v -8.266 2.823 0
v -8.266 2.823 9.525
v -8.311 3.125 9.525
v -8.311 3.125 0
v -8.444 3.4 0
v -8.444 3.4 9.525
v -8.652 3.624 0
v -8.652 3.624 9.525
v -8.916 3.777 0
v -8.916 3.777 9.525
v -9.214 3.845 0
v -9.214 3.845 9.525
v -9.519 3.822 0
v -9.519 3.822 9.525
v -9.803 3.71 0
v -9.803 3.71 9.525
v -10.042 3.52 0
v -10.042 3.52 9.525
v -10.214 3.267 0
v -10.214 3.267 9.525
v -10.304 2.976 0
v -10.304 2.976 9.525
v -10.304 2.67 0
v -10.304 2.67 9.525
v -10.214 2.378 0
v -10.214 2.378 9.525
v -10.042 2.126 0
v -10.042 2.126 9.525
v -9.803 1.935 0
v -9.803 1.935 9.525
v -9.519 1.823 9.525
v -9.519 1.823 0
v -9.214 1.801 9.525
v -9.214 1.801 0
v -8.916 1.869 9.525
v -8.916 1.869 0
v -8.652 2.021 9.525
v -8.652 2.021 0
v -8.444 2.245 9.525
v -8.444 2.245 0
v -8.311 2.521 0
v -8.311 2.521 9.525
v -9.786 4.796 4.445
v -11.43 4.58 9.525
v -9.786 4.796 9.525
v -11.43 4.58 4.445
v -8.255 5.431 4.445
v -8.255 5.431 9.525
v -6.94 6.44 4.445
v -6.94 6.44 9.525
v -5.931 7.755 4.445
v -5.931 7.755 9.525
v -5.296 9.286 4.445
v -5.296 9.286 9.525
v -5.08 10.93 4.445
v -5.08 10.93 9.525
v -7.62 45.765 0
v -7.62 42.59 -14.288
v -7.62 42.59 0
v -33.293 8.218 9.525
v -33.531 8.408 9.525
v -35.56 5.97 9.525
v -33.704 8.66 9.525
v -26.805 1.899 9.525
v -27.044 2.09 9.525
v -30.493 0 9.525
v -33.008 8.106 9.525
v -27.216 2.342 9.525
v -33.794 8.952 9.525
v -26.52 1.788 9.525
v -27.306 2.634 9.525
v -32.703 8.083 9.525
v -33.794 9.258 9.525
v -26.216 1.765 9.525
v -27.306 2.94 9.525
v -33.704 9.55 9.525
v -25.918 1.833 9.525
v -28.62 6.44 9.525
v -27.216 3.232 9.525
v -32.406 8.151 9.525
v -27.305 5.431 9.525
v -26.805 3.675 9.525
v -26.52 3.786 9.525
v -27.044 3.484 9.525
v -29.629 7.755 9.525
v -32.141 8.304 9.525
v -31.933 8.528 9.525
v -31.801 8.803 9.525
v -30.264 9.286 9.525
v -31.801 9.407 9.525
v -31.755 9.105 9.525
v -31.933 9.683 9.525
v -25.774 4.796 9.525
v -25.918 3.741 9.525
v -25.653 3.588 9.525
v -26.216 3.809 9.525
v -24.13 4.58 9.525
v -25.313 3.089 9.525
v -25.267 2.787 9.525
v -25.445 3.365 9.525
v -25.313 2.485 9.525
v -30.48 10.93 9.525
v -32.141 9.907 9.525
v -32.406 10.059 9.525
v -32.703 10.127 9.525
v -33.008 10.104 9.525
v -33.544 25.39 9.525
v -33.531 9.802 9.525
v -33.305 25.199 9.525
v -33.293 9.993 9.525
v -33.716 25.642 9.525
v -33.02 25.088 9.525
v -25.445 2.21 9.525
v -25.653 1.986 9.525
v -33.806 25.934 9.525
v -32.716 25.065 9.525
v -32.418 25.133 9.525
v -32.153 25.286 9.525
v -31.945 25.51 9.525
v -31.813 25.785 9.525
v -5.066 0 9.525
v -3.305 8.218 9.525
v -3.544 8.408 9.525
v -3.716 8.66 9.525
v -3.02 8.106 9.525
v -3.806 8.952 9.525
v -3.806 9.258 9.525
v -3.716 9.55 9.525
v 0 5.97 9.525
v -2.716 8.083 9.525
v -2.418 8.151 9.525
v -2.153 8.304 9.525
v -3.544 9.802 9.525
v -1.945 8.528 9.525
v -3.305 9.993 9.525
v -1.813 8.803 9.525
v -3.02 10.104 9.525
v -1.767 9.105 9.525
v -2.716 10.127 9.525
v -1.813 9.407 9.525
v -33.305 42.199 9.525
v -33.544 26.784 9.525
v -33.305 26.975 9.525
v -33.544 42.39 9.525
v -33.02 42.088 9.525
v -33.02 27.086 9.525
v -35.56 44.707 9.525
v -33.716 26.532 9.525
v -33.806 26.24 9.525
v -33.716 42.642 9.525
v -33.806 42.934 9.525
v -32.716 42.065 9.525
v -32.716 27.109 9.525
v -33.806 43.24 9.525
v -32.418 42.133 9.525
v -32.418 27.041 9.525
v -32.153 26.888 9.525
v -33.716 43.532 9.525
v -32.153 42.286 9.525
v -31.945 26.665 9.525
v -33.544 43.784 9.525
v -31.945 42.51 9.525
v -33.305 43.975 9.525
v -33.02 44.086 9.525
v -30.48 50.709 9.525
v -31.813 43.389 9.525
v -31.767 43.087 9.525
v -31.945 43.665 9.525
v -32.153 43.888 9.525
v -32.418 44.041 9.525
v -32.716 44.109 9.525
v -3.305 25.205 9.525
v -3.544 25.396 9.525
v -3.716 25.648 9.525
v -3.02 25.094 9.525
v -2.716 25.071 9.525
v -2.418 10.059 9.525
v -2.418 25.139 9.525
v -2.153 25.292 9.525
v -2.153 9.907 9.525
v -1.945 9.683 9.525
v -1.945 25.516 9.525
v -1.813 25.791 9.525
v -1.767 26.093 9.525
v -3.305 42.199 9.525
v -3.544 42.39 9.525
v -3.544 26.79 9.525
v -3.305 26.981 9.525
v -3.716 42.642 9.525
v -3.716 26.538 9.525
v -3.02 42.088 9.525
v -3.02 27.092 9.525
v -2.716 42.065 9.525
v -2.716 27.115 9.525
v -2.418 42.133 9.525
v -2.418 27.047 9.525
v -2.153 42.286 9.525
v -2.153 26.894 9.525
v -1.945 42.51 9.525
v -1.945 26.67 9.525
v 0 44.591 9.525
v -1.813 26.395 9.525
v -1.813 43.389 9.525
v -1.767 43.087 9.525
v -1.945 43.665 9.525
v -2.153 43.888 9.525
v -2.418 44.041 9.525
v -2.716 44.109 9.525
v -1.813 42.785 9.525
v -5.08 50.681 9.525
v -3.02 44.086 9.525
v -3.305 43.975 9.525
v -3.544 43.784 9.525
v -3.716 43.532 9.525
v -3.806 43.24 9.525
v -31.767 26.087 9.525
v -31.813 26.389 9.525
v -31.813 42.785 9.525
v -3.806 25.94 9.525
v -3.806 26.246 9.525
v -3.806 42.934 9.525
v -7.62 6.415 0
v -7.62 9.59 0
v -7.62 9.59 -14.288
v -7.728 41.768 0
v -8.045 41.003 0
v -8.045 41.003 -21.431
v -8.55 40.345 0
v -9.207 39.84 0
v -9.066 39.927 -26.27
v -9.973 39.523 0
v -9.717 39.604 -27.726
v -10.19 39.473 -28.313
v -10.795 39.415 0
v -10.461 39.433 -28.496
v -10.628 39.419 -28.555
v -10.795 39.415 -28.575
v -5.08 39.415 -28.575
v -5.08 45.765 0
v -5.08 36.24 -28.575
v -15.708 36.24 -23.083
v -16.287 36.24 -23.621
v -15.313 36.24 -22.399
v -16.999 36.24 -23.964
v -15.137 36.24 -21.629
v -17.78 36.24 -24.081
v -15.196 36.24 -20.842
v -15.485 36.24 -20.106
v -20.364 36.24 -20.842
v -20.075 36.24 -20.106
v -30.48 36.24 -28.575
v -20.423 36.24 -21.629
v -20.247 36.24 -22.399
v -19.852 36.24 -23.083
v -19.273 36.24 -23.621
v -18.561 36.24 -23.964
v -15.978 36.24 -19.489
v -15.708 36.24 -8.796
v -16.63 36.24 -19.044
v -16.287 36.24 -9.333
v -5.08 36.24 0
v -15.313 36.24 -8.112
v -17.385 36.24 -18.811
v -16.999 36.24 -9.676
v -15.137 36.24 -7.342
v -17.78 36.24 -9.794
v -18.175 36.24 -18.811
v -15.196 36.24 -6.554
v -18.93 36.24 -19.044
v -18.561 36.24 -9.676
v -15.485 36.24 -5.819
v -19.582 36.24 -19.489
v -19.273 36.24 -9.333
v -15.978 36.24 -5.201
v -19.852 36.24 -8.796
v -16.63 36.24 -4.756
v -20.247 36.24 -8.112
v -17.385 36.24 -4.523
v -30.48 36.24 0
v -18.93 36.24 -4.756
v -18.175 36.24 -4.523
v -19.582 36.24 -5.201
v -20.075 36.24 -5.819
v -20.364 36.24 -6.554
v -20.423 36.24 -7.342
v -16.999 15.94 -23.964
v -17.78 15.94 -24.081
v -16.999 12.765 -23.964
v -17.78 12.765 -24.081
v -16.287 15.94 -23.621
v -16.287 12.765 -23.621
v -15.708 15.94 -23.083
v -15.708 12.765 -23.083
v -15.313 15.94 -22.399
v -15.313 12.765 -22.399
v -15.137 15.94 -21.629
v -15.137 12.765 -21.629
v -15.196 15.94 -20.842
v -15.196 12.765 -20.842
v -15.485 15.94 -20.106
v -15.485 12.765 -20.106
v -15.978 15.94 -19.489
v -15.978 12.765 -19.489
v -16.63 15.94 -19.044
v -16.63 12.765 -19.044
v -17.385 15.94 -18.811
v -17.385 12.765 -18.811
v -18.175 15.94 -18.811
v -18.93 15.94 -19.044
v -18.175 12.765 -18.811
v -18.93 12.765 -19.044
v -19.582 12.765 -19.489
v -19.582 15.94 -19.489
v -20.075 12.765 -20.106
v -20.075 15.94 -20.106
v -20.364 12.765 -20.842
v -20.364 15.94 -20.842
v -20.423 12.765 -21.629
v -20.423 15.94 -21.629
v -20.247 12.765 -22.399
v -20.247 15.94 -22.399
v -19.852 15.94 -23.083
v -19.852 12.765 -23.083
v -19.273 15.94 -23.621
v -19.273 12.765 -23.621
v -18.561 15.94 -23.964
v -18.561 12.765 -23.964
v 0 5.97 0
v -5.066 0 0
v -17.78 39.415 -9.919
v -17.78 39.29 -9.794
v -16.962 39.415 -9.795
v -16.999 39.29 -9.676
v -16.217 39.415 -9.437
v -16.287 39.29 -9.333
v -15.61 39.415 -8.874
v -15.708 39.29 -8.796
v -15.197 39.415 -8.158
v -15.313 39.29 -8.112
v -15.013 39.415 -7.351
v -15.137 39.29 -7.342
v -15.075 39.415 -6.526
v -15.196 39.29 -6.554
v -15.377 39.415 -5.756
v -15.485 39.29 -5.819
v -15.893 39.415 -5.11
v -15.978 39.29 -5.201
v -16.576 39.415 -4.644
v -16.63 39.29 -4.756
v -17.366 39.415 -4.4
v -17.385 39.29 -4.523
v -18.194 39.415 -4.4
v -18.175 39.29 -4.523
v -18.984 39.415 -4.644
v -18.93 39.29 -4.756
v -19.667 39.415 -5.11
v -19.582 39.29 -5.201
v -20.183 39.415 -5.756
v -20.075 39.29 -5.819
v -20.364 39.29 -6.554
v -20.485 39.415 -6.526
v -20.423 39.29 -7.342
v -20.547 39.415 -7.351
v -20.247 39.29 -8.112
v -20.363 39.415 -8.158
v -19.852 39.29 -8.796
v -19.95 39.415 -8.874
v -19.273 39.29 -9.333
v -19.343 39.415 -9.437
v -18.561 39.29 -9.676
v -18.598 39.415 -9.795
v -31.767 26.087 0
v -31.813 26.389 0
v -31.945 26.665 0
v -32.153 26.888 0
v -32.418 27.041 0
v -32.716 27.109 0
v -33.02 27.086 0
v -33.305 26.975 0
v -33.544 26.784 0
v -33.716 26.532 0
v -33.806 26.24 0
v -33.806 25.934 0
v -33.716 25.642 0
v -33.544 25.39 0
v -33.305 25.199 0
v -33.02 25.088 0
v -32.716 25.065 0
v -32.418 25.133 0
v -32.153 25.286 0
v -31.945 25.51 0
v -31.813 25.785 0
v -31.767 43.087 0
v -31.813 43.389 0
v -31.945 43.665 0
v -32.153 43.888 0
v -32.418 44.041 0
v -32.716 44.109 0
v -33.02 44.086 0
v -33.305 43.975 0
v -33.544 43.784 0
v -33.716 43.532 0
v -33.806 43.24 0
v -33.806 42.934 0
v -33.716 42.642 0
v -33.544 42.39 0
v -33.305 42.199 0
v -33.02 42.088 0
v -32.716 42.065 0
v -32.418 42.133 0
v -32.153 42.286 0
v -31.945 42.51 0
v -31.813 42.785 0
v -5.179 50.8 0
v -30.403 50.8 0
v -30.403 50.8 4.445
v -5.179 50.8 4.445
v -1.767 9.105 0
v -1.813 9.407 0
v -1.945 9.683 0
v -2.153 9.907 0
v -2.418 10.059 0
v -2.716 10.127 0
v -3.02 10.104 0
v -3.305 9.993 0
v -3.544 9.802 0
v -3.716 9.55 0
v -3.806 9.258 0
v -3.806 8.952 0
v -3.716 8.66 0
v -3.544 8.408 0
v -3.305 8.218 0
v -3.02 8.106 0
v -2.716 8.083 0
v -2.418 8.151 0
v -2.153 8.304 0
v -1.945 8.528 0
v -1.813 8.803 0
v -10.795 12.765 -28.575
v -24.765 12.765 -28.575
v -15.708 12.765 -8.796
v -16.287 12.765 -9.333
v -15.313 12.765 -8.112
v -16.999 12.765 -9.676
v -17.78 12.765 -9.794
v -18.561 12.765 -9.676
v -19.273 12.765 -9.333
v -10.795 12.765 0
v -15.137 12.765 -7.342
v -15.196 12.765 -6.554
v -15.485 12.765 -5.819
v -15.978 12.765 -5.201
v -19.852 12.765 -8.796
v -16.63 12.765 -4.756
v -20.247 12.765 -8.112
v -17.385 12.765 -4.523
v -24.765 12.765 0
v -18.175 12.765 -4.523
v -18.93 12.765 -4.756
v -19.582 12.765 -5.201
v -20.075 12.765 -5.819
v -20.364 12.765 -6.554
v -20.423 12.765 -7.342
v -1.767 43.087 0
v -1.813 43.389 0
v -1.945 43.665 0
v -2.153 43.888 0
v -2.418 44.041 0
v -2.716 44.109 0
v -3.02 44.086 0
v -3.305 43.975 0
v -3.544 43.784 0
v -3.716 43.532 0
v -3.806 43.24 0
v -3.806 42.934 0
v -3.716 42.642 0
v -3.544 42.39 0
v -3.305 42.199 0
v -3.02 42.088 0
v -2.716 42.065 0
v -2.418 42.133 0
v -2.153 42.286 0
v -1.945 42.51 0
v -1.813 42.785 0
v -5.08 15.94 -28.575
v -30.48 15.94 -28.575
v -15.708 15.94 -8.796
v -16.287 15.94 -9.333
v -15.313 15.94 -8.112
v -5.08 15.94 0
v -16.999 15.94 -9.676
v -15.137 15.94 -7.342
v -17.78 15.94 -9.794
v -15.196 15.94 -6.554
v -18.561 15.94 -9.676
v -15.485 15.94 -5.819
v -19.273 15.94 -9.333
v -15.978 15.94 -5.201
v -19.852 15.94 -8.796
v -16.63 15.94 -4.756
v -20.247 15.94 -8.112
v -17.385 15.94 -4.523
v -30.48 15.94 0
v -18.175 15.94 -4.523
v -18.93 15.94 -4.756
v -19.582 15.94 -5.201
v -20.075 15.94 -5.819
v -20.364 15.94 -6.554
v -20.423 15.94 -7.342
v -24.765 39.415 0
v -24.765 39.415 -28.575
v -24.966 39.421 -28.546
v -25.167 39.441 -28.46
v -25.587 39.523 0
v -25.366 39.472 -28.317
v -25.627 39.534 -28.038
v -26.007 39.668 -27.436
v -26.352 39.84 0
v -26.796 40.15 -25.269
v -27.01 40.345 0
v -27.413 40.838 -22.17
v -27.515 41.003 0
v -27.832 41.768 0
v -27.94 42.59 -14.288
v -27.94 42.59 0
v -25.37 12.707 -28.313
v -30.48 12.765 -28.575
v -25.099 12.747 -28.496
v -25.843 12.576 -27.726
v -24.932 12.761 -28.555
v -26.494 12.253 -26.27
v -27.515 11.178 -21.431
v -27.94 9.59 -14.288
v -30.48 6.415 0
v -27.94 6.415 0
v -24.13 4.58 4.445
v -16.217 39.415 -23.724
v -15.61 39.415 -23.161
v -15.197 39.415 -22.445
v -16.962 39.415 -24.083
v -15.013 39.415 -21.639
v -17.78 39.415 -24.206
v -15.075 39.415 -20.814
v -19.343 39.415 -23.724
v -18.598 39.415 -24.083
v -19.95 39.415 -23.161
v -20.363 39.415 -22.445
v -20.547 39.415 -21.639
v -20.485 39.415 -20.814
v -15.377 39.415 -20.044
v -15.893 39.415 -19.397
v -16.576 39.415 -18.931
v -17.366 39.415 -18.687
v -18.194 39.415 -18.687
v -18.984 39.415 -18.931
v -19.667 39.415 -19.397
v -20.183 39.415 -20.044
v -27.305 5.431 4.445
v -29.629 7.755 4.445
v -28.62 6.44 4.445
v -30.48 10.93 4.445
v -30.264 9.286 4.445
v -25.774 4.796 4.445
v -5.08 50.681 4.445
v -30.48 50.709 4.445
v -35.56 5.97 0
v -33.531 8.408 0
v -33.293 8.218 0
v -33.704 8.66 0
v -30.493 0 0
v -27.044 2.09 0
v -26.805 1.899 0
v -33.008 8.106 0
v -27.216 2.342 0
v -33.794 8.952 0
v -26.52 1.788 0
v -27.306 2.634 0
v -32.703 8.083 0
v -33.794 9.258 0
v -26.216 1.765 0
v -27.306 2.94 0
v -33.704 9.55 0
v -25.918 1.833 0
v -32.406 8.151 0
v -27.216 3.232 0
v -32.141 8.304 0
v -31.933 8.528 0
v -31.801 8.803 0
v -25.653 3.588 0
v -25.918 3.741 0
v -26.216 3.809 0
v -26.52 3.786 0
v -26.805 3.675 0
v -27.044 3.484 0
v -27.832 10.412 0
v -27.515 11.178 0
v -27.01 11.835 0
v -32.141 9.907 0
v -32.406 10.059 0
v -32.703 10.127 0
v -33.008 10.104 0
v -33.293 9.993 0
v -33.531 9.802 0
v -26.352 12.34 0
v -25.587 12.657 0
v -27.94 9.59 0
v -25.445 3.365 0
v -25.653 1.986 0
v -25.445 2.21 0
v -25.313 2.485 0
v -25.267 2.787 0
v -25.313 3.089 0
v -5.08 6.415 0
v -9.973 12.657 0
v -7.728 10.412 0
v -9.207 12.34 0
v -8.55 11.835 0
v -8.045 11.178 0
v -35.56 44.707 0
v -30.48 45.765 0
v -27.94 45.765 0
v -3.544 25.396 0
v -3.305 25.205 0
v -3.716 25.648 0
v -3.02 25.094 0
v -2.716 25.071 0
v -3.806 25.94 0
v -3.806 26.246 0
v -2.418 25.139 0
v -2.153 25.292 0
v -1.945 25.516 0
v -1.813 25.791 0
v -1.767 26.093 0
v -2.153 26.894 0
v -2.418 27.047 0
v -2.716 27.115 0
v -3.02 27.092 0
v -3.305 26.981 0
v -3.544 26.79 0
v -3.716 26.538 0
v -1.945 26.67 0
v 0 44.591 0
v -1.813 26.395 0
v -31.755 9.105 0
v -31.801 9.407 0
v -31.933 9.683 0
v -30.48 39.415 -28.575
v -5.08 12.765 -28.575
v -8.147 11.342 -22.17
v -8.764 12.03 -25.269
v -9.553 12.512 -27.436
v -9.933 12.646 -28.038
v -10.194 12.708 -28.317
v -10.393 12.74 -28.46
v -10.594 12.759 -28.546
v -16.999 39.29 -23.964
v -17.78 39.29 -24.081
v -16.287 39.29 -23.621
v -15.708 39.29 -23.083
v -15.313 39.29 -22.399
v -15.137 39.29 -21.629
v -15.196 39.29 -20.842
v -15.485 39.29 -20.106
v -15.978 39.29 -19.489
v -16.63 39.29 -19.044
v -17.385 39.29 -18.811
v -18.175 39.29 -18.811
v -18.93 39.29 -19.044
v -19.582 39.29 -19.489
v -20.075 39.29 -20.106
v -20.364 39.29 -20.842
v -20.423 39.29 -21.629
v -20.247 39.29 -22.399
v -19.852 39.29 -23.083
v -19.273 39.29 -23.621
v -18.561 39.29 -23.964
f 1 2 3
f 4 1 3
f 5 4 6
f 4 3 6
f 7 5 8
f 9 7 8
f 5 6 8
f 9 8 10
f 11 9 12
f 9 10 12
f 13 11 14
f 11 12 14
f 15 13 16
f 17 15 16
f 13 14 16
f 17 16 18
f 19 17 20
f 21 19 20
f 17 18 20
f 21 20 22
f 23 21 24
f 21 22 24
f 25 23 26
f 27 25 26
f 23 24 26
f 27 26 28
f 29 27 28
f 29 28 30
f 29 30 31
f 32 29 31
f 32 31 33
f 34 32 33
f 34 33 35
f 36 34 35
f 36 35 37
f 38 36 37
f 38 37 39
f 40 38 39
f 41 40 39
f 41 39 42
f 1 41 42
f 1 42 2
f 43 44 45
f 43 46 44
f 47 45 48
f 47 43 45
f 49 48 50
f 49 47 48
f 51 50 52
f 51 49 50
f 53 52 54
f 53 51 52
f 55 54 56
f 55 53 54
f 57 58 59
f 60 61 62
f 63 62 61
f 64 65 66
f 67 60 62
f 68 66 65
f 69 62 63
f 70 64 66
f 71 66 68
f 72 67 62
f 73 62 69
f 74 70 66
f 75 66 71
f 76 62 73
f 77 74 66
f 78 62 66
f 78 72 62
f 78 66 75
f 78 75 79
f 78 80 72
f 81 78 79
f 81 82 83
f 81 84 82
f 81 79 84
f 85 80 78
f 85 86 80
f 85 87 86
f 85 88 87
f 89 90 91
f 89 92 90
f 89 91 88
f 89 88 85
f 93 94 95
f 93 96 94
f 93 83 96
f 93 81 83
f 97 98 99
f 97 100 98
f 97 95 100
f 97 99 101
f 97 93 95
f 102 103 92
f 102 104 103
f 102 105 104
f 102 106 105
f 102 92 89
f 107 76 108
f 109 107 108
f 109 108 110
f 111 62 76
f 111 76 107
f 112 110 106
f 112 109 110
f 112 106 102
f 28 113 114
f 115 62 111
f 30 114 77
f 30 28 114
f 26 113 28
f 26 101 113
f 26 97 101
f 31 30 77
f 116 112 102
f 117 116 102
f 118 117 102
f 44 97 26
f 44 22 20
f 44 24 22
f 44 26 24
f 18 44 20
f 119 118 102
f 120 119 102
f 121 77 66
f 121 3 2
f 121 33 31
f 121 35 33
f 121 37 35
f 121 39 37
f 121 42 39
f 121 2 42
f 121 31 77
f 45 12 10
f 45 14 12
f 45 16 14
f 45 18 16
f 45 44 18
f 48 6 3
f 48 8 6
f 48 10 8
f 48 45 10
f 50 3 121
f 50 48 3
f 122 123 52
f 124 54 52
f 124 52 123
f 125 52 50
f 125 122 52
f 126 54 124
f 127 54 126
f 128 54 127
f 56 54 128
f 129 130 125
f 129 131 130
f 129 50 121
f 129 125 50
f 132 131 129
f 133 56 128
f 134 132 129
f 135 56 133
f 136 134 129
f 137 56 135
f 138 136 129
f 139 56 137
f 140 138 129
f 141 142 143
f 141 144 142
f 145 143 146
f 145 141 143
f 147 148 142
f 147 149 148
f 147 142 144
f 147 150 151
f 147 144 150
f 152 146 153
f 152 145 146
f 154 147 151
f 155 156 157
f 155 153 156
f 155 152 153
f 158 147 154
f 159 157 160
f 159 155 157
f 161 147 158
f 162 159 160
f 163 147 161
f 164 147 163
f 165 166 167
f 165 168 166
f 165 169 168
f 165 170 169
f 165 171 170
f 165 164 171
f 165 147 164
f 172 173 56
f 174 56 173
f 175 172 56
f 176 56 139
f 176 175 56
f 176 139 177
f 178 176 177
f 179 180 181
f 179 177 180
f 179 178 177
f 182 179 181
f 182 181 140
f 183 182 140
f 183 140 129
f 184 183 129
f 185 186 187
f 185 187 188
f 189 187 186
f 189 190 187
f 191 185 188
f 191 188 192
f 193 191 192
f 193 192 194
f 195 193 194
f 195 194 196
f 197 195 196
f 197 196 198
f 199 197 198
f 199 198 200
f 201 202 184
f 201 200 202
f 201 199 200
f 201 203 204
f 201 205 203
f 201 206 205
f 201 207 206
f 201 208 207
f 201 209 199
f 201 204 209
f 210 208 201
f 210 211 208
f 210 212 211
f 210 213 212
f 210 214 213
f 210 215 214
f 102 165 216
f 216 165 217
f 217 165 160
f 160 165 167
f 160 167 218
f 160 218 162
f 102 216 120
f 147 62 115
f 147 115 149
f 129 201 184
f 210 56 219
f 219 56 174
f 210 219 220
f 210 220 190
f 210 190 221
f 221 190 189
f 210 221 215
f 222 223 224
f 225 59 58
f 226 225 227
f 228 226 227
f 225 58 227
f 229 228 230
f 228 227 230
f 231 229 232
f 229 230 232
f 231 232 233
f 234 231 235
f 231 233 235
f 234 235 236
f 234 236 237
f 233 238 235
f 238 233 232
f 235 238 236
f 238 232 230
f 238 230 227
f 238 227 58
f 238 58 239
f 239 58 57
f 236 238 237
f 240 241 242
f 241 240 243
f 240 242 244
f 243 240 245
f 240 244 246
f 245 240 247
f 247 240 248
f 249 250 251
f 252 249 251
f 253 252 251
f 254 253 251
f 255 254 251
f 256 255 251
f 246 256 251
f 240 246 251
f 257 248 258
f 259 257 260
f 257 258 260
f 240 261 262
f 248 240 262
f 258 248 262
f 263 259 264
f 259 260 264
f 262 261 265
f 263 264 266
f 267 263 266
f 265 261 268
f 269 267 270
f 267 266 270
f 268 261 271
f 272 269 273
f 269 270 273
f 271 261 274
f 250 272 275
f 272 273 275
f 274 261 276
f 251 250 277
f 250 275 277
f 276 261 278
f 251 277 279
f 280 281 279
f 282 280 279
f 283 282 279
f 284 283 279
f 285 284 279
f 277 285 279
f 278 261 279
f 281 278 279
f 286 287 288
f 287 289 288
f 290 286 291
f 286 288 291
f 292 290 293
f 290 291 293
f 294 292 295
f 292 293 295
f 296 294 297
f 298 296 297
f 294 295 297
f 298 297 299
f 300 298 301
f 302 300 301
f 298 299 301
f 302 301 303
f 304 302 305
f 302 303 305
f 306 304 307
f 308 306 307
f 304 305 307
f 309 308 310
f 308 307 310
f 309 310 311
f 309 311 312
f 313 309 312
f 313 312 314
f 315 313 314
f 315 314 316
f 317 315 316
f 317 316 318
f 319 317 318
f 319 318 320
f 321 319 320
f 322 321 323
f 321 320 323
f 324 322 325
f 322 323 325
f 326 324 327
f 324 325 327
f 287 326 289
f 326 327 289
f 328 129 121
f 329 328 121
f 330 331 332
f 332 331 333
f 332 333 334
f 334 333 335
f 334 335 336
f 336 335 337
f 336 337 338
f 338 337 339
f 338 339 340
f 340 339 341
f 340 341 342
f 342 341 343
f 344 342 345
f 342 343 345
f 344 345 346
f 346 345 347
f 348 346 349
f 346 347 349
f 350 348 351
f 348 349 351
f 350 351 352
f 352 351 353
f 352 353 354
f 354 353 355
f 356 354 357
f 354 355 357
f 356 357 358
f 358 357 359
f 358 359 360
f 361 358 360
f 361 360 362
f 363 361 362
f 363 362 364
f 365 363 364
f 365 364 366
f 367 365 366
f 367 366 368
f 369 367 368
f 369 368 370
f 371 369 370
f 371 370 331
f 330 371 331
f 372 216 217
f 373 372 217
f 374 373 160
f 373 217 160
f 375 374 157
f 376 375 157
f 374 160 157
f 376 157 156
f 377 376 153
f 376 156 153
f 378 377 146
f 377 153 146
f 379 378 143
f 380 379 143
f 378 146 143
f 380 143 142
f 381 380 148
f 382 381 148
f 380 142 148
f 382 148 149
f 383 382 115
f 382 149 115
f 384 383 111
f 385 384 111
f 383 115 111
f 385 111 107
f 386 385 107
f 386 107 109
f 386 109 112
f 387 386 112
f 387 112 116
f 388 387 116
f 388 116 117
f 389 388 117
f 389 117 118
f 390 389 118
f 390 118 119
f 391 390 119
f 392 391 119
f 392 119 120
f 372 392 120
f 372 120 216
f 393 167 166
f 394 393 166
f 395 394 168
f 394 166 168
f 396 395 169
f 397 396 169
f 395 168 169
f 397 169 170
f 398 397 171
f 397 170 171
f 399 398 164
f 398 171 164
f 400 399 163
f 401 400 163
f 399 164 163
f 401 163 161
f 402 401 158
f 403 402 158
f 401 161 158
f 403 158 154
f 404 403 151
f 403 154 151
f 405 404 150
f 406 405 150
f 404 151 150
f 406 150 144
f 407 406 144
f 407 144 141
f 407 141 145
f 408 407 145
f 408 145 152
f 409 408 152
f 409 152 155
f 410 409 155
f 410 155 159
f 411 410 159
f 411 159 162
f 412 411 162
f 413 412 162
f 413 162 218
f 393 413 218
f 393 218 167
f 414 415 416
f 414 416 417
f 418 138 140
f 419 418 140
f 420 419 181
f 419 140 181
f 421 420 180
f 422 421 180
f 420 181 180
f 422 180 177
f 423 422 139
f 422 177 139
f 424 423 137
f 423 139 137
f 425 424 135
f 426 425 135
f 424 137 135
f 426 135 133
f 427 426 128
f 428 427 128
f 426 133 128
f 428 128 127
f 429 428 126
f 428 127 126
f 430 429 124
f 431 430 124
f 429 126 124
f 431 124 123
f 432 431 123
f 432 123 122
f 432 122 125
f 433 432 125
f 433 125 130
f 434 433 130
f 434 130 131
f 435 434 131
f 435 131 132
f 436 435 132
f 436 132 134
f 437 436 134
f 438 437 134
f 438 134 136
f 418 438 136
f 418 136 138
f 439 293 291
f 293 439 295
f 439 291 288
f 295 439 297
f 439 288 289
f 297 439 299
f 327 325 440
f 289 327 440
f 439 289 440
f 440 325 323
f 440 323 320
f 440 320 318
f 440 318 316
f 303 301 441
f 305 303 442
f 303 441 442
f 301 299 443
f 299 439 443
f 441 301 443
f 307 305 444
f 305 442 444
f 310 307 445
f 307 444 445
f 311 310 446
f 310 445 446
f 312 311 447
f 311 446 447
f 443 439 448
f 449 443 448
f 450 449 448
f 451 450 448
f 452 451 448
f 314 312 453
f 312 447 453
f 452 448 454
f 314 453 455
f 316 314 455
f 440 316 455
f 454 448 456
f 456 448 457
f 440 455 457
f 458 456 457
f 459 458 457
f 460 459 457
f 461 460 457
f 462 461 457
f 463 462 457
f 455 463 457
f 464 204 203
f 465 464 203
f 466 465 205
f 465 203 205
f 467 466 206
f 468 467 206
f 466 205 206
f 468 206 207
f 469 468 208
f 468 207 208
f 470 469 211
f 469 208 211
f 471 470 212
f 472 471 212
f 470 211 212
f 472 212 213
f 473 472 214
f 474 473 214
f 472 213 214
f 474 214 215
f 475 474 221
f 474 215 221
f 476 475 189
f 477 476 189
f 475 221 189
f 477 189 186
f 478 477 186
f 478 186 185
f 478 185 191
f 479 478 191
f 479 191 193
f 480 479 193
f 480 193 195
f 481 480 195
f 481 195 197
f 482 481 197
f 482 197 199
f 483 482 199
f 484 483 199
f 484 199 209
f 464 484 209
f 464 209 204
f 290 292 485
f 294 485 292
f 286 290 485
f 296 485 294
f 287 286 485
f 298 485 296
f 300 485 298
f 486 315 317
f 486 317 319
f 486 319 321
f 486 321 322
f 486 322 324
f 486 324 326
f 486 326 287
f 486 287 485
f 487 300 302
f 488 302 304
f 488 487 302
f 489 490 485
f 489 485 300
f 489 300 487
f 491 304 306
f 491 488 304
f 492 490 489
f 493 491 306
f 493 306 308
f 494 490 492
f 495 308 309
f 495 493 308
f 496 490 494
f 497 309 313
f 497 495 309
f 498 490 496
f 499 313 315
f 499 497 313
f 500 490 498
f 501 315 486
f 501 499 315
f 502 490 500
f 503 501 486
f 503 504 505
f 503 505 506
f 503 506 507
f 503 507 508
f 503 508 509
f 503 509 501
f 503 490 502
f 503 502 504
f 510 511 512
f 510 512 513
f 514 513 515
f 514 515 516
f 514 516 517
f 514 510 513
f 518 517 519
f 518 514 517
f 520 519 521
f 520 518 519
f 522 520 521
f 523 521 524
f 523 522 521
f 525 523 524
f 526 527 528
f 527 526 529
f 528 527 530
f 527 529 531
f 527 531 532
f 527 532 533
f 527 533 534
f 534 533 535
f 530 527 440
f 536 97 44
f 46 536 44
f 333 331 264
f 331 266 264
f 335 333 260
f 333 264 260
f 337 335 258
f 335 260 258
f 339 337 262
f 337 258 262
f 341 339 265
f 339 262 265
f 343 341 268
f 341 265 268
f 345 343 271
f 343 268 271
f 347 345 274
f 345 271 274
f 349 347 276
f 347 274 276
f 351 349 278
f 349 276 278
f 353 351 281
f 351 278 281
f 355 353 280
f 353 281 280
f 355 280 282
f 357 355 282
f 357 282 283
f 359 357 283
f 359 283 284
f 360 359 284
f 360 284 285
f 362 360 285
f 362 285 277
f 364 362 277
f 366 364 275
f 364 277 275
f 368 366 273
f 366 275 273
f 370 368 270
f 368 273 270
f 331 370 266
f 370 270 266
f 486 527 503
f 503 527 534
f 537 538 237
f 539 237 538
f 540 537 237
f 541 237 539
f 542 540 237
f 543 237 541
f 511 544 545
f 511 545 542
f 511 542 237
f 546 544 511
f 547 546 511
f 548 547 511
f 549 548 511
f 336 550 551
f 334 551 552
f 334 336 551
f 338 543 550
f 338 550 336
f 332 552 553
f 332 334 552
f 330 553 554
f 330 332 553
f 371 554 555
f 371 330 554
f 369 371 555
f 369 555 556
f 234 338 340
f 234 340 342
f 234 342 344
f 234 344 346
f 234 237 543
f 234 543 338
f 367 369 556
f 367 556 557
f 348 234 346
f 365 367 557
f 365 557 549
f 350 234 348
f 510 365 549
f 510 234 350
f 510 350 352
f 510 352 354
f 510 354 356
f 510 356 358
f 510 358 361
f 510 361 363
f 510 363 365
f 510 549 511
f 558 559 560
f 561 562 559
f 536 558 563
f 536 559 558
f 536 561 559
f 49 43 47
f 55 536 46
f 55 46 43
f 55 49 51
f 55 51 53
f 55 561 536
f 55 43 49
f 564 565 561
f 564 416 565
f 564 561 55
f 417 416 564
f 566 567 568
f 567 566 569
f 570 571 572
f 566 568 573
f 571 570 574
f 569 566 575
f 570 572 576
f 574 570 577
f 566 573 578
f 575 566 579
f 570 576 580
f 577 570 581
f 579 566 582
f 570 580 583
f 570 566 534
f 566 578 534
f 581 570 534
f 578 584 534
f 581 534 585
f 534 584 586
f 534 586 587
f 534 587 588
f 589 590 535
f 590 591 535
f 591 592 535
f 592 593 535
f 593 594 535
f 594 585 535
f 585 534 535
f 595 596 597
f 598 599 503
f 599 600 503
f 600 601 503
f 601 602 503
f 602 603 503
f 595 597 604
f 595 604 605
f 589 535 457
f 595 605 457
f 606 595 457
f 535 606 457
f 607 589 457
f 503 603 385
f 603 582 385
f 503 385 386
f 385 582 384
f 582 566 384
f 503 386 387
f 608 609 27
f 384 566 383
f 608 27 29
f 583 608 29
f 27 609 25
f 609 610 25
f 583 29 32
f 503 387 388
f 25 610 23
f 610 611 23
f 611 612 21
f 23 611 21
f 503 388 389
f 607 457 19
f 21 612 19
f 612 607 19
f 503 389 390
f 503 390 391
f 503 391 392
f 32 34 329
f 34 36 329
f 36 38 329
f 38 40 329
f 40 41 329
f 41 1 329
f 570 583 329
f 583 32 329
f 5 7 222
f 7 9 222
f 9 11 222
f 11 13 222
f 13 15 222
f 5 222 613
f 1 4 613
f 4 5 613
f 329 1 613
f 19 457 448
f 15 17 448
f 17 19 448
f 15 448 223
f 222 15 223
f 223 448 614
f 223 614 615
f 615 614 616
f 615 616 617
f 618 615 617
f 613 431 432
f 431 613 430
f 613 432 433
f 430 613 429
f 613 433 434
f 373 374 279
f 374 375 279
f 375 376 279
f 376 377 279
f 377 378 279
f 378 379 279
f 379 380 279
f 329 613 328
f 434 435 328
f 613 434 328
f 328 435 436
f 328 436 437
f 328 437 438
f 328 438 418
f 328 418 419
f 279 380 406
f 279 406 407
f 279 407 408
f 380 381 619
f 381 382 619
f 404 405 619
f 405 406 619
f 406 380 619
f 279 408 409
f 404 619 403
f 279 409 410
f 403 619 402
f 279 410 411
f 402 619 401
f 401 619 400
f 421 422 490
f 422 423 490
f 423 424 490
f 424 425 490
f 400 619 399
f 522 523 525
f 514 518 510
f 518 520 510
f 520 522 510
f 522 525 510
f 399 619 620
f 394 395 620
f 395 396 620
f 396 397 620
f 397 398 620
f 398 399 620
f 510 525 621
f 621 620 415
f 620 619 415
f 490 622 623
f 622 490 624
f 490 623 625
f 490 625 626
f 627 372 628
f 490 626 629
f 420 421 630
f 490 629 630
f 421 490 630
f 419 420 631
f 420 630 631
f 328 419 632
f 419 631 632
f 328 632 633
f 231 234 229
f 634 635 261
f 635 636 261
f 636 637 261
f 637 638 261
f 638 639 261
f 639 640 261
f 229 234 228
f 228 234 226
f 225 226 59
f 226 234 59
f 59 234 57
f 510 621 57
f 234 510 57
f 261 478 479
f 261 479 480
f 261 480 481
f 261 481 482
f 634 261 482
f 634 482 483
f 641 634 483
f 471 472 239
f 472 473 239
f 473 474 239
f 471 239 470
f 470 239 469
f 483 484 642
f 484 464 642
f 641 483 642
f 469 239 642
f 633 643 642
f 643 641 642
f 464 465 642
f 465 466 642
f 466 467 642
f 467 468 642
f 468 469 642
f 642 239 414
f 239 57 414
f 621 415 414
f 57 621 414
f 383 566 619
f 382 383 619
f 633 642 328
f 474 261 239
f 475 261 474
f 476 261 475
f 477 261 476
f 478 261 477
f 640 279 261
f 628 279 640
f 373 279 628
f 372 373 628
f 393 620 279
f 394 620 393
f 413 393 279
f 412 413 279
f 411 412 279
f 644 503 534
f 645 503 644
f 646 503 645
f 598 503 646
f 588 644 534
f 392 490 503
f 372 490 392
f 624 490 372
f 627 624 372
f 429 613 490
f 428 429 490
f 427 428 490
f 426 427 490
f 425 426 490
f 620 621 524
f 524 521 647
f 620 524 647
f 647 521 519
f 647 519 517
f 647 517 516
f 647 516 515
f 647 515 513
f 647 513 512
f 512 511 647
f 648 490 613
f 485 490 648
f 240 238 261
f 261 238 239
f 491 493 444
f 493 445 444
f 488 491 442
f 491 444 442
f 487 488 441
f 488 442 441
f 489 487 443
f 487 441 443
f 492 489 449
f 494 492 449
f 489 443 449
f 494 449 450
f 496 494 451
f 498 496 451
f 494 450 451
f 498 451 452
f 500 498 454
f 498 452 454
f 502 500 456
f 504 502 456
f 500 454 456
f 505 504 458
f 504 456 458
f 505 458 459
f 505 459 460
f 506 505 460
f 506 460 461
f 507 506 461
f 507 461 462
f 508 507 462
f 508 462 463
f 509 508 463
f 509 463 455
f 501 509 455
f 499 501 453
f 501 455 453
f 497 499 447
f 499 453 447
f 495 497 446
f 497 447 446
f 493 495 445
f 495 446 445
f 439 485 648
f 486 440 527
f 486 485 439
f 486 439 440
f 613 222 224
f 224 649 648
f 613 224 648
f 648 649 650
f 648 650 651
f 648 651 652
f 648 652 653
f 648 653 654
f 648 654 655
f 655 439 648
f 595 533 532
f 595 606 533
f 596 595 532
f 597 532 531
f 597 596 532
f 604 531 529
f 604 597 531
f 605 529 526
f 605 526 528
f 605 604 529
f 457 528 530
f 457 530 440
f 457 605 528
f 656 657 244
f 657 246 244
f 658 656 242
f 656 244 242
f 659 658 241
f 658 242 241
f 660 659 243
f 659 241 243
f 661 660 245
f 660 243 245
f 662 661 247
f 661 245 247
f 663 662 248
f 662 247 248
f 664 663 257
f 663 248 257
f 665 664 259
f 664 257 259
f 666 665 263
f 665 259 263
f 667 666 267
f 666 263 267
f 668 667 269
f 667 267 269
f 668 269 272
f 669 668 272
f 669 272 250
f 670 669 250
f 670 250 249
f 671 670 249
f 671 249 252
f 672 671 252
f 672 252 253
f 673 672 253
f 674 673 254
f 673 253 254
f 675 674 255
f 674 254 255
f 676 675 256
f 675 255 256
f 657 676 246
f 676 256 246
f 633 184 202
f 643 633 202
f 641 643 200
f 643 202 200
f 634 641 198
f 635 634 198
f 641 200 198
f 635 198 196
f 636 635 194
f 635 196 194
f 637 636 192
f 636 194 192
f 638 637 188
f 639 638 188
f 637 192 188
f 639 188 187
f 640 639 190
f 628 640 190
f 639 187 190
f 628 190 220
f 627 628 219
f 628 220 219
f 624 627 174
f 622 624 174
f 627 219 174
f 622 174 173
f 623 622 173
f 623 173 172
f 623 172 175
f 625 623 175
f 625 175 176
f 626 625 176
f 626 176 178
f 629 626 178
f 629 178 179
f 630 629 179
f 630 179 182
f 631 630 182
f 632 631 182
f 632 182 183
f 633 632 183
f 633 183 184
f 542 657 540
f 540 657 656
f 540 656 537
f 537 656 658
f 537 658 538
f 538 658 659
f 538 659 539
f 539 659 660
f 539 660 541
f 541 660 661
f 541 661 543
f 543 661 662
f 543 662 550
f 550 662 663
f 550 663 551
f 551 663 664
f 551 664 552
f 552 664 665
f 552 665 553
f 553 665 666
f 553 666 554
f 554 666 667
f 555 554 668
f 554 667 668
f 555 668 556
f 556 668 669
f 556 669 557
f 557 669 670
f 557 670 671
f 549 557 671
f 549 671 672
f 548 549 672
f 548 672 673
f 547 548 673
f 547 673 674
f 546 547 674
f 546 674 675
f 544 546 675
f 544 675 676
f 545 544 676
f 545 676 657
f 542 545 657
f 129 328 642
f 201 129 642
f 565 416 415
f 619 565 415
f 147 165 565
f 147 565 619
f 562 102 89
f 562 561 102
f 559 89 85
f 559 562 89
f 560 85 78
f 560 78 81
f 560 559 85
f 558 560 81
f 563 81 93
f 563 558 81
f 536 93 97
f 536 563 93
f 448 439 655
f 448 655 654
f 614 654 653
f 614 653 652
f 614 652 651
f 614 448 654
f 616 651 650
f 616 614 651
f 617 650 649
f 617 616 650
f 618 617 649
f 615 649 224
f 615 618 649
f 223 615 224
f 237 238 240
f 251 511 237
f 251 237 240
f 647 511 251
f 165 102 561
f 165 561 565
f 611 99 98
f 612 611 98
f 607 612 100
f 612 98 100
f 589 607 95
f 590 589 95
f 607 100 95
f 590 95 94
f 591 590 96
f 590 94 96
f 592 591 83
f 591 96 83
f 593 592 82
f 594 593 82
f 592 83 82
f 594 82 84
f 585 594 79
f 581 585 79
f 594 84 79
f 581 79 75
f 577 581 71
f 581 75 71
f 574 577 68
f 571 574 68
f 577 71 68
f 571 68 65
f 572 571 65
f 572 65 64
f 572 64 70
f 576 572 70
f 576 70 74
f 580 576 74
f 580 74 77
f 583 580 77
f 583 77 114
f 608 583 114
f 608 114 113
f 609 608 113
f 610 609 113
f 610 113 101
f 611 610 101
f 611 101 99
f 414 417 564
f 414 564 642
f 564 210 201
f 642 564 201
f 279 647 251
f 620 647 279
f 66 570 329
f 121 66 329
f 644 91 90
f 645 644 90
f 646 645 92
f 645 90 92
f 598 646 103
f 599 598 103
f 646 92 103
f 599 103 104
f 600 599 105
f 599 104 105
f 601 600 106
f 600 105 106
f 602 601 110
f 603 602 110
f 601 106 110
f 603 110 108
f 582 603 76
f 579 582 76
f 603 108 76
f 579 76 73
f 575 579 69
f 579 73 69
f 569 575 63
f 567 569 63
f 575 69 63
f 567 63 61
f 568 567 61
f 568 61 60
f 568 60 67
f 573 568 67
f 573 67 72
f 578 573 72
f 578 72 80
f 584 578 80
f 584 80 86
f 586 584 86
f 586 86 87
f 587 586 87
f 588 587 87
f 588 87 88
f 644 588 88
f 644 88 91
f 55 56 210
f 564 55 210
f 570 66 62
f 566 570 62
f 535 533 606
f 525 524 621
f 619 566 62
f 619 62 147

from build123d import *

# Parameters (mm, degrees)
SKETCH1_W                      = 35.56
SKETCH1_H                      = 50.8
BOSS_EXTRUDE1_DEPTH            = 9.525
SKETCH2_W                      = 25.4
SKETCH2_H                      = 46.22
CUT_EXTRUDE2_DEPTH             = 5.08
TAP_DRILL_FOR_M2_5X0_45_TAP1_D = 2.05
SKETCH13_W                     = 25.4
SKETCH13_H                     = 3.175
BOSS_EXTRUDE2_DEPTH            = 28.575
CUT_EXTRUDE3_DEPTH             = 73.778867812
FILLET1_R                      = 6.35
M5_CLEARANCE_HOLE1_D           = 5.3
M5_CLEARANCE_HOLE1_CSINK_D     = 5.55
M5_CLEARANCE_HOLE1_CSINK_ANGLE = 90
RIB7_REACH                     = 67.774
SKETCH14_WALL_W                = 162.819779212
SKETCH14_WALL_H                = 2.54
RIB8_REACH                     = 67.774
SKETCH15_WALL_W                = 162.819779212
SKETCH15_WALL_H                = 2.54
RIB9_REACH                     = 67.774
SKETCH17_WALL_W                = 162.819779212
SKETCH17_WALL_H                = 2.54
RIB10_REACH                    = 67.774
SKETCH16_WALL_W                = 162.819779212
SKETCH16_WALL_H                = 2.54
FILLET2_R                      = 3.175
FILLET3_R                      = 3.175


with BuildPart() as part:
    # Sketch1 → Boss-Extrude1 (new body)
    with BuildSketch(Plane.XY):
        with Locations((-17.78, 25.4)):
            Rectangle(SKETCH1_W, SKETCH1_H)
    extrude(amount=BOSS_EXTRUDE1_DEPTH)

    # Sketch2 → Cut-Extrude2 (cut)
    with BuildSketch(Plane.XY.offset(9.525)):
        with Locations((-17.78, 27.69)):
            Rectangle(SKETCH2_W, SKETCH2_H)
    extrude(amount=-CUT_EXTRUDE2_DEPTH, mode=Mode.SUBTRACT)

    # Tap Drill for M2.5x0.45 Tap1 (through all)
    with Locations(Plane(origin=(0, 0, 0), x_dir=(-1, 0, 0), z_dir=(0, 0, -1))):
        with Locations((2.792369004, 43.087106138), (2.792369004, 26.092979092), (2.792369004, 9.105182099), (9.290740849, 2.822744672), (26.292369004, 2.787106138), (32.780032006, 9.105182099), (32.792369004, 26.087106138), (32.792369004, 43.087106138)):
            Hole(TAP_DRILL_FOR_M2_5X0_45_TAP1_D / 2)

    # Sketch13 → Boss-Extrude2 (add)
    with BuildSketch(Plane(origin=(0, 0, 0), x_dir=(-1, 0, 0), z_dir=(0, 0, -1))):
        with Locations((17.78, 37.827545037)):
            Rectangle(SKETCH13_W, SKETCH13_H)
        with Locations((17.78, 14.352545037)):
            Rectangle(SKETCH13_W, SKETCH13_H)
    extrude(amount=BOSS_EXTRUDE2_DEPTH)

    # Sketch8 → Cut-Extrude3 (cut, through all)
    with BuildSketch(Plane.XY.offset(9.525)):
        Polygon((-5.178964387, 50.8), (0, 44.591495864), (0, 50.8), align=None)
        Polygon((-35.56, 44.706622517), (-35.56, 50.8), (-30.402645731, 50.8), align=None)
        Polygon((-35.56, 5.970049098), (-35.56, 0), (-30.492594088, 0), align=None)
        Polygon((-5.092594088, -0.031324356), (0, 0), (0, 5.970049098), align=None)
    extrude(amount=-CUT_EXTRUDE3_DEPTH, mode=Mode.SUBTRACT)

    # Fillet1
    fillet1_edges = [part.edges().sort_by_distance(p)[0] for p in [
        (-5.08, 4.58, 6.985),
        (-30.48, 4.58, 6.985),
    ]]
    fillet(fillet1_edges, radius=FILLET1_R)

    # M5 Clearance Hole1 (through all)
    with Locations(Plane(origin=(-17.78, 39.415045037, -7.14375), x_dir=(0, 0, 1), z_dir=(0, 1, 0))):
        with Locations((0, 0), (-14.2875, 0)):
            CounterSinkHole(M5_CLEARANCE_HOLE1_D / 2, M5_CLEARANCE_HOLE1_CSINK_D / 2, counter_sink_angle=M5_CLEARANCE_HOLE1_CSINK_ANGLE)

    # Sketch14 wall → Rib7 (add, up to next)
    with BuildSketch(Plane(origin=(-30.48, 9.590045037, -14.2875), x_dir=(0, -0.216930457819, 0.976187060184), z_dir=(0, 0.976187060184, 0.216930457819)), mode=Mode.PRIVATE) as rib7_sk1:
        with Locations((0, 1.27)):
            Rectangle(SKETCH14_WALL_W, SKETCH14_WALL_H)
    rib7_tool1 = extrude(rib7_sk1.sketch, amount=RIB7_REACH, mode=Mode.PRIVATE) - part.part
    add(rib7_tool1.solids().sort_by_distance((-30.48, 9.590045037, -14.2875))[0])

    # Sketch15 wall → Rib8 (add, up to next)
    with BuildSketch(Plane(origin=(-5.08, 9.590045037, -14.2875), x_dir=(0, -0.216930457819, 0.976187060184), z_dir=(0, -0.976187060184, -0.216930457819)), mode=Mode.PRIVATE) as rib8_sk1:
        with Locations((0, 1.27)):
            Rectangle(SKETCH15_WALL_W, SKETCH15_WALL_H)
    rib8_tool1 = extrude(rib8_sk1.sketch, amount=-RIB8_REACH, mode=Mode.PRIVATE) - part.part
    add(rib8_tool1.solids().sort_by_distance((-5.08, 9.590045037, -14.2875))[0])

    # Sketch17 wall → Rib9 (add, up to next)
    with BuildSketch(Plane(origin=(-5.08, 42.590045037, -14.2875), x_dir=(0, 0.216930457819, 0.976187060184), z_dir=(0, -0.976187060184, 0.216930457819)), mode=Mode.PRIVATE) as rib9_sk1:
        with Locations((0, 1.27)):
            Rectangle(SKETCH17_WALL_W, SKETCH17_WALL_H)
    rib9_tool1 = extrude(rib9_sk1.sketch, amount=RIB9_REACH, mode=Mode.PRIVATE) - part.part
    add(rib9_tool1.solids().sort_by_distance((-5.08, 42.590045037, -14.2875))[0])

    # Sketch16 wall → Rib10 (add, up to next)
    with BuildSketch(Plane(origin=(-30.48, 42.590045037, -14.2875), x_dir=(0, 0.216930457819, 0.976187060184), z_dir=(0, 0.976187060184, -0.216930457819)), mode=Mode.PRIVATE) as rib10_sk1:
        with Locations((0, 1.27)):
            Rectangle(SKETCH16_WALL_W, SKETCH16_WALL_H)
    rib10_tool1 = extrude(rib10_sk1.sketch, amount=-RIB10_REACH, mode=Mode.PRIVATE) - part.part
    add(rib10_tool1.solids().sort_by_distance((-30.48, 42.590045037, -14.2875))[0])

    # Fillet2
    fillet2_edges = [part.edges().sort_by_distance(p)[0] for p in [
        (-27.94, 12.765045037, -14.2875),
        (-7.62, 12.765045037, -14.2875),
    ]]
    fillet(fillet2_edges, radius=FILLET2_R)

    # Fillet3
    fillet3_edges = [part.edges().sort_by_distance(p)[0] for p in [
        (-7.62, 39.415045037, -14.2875),
        (-27.94, 39.415045037, -14.2875),
    ]]
    fillet(fillet3_edges, radius=FILLET3_R)


solid = part.part
